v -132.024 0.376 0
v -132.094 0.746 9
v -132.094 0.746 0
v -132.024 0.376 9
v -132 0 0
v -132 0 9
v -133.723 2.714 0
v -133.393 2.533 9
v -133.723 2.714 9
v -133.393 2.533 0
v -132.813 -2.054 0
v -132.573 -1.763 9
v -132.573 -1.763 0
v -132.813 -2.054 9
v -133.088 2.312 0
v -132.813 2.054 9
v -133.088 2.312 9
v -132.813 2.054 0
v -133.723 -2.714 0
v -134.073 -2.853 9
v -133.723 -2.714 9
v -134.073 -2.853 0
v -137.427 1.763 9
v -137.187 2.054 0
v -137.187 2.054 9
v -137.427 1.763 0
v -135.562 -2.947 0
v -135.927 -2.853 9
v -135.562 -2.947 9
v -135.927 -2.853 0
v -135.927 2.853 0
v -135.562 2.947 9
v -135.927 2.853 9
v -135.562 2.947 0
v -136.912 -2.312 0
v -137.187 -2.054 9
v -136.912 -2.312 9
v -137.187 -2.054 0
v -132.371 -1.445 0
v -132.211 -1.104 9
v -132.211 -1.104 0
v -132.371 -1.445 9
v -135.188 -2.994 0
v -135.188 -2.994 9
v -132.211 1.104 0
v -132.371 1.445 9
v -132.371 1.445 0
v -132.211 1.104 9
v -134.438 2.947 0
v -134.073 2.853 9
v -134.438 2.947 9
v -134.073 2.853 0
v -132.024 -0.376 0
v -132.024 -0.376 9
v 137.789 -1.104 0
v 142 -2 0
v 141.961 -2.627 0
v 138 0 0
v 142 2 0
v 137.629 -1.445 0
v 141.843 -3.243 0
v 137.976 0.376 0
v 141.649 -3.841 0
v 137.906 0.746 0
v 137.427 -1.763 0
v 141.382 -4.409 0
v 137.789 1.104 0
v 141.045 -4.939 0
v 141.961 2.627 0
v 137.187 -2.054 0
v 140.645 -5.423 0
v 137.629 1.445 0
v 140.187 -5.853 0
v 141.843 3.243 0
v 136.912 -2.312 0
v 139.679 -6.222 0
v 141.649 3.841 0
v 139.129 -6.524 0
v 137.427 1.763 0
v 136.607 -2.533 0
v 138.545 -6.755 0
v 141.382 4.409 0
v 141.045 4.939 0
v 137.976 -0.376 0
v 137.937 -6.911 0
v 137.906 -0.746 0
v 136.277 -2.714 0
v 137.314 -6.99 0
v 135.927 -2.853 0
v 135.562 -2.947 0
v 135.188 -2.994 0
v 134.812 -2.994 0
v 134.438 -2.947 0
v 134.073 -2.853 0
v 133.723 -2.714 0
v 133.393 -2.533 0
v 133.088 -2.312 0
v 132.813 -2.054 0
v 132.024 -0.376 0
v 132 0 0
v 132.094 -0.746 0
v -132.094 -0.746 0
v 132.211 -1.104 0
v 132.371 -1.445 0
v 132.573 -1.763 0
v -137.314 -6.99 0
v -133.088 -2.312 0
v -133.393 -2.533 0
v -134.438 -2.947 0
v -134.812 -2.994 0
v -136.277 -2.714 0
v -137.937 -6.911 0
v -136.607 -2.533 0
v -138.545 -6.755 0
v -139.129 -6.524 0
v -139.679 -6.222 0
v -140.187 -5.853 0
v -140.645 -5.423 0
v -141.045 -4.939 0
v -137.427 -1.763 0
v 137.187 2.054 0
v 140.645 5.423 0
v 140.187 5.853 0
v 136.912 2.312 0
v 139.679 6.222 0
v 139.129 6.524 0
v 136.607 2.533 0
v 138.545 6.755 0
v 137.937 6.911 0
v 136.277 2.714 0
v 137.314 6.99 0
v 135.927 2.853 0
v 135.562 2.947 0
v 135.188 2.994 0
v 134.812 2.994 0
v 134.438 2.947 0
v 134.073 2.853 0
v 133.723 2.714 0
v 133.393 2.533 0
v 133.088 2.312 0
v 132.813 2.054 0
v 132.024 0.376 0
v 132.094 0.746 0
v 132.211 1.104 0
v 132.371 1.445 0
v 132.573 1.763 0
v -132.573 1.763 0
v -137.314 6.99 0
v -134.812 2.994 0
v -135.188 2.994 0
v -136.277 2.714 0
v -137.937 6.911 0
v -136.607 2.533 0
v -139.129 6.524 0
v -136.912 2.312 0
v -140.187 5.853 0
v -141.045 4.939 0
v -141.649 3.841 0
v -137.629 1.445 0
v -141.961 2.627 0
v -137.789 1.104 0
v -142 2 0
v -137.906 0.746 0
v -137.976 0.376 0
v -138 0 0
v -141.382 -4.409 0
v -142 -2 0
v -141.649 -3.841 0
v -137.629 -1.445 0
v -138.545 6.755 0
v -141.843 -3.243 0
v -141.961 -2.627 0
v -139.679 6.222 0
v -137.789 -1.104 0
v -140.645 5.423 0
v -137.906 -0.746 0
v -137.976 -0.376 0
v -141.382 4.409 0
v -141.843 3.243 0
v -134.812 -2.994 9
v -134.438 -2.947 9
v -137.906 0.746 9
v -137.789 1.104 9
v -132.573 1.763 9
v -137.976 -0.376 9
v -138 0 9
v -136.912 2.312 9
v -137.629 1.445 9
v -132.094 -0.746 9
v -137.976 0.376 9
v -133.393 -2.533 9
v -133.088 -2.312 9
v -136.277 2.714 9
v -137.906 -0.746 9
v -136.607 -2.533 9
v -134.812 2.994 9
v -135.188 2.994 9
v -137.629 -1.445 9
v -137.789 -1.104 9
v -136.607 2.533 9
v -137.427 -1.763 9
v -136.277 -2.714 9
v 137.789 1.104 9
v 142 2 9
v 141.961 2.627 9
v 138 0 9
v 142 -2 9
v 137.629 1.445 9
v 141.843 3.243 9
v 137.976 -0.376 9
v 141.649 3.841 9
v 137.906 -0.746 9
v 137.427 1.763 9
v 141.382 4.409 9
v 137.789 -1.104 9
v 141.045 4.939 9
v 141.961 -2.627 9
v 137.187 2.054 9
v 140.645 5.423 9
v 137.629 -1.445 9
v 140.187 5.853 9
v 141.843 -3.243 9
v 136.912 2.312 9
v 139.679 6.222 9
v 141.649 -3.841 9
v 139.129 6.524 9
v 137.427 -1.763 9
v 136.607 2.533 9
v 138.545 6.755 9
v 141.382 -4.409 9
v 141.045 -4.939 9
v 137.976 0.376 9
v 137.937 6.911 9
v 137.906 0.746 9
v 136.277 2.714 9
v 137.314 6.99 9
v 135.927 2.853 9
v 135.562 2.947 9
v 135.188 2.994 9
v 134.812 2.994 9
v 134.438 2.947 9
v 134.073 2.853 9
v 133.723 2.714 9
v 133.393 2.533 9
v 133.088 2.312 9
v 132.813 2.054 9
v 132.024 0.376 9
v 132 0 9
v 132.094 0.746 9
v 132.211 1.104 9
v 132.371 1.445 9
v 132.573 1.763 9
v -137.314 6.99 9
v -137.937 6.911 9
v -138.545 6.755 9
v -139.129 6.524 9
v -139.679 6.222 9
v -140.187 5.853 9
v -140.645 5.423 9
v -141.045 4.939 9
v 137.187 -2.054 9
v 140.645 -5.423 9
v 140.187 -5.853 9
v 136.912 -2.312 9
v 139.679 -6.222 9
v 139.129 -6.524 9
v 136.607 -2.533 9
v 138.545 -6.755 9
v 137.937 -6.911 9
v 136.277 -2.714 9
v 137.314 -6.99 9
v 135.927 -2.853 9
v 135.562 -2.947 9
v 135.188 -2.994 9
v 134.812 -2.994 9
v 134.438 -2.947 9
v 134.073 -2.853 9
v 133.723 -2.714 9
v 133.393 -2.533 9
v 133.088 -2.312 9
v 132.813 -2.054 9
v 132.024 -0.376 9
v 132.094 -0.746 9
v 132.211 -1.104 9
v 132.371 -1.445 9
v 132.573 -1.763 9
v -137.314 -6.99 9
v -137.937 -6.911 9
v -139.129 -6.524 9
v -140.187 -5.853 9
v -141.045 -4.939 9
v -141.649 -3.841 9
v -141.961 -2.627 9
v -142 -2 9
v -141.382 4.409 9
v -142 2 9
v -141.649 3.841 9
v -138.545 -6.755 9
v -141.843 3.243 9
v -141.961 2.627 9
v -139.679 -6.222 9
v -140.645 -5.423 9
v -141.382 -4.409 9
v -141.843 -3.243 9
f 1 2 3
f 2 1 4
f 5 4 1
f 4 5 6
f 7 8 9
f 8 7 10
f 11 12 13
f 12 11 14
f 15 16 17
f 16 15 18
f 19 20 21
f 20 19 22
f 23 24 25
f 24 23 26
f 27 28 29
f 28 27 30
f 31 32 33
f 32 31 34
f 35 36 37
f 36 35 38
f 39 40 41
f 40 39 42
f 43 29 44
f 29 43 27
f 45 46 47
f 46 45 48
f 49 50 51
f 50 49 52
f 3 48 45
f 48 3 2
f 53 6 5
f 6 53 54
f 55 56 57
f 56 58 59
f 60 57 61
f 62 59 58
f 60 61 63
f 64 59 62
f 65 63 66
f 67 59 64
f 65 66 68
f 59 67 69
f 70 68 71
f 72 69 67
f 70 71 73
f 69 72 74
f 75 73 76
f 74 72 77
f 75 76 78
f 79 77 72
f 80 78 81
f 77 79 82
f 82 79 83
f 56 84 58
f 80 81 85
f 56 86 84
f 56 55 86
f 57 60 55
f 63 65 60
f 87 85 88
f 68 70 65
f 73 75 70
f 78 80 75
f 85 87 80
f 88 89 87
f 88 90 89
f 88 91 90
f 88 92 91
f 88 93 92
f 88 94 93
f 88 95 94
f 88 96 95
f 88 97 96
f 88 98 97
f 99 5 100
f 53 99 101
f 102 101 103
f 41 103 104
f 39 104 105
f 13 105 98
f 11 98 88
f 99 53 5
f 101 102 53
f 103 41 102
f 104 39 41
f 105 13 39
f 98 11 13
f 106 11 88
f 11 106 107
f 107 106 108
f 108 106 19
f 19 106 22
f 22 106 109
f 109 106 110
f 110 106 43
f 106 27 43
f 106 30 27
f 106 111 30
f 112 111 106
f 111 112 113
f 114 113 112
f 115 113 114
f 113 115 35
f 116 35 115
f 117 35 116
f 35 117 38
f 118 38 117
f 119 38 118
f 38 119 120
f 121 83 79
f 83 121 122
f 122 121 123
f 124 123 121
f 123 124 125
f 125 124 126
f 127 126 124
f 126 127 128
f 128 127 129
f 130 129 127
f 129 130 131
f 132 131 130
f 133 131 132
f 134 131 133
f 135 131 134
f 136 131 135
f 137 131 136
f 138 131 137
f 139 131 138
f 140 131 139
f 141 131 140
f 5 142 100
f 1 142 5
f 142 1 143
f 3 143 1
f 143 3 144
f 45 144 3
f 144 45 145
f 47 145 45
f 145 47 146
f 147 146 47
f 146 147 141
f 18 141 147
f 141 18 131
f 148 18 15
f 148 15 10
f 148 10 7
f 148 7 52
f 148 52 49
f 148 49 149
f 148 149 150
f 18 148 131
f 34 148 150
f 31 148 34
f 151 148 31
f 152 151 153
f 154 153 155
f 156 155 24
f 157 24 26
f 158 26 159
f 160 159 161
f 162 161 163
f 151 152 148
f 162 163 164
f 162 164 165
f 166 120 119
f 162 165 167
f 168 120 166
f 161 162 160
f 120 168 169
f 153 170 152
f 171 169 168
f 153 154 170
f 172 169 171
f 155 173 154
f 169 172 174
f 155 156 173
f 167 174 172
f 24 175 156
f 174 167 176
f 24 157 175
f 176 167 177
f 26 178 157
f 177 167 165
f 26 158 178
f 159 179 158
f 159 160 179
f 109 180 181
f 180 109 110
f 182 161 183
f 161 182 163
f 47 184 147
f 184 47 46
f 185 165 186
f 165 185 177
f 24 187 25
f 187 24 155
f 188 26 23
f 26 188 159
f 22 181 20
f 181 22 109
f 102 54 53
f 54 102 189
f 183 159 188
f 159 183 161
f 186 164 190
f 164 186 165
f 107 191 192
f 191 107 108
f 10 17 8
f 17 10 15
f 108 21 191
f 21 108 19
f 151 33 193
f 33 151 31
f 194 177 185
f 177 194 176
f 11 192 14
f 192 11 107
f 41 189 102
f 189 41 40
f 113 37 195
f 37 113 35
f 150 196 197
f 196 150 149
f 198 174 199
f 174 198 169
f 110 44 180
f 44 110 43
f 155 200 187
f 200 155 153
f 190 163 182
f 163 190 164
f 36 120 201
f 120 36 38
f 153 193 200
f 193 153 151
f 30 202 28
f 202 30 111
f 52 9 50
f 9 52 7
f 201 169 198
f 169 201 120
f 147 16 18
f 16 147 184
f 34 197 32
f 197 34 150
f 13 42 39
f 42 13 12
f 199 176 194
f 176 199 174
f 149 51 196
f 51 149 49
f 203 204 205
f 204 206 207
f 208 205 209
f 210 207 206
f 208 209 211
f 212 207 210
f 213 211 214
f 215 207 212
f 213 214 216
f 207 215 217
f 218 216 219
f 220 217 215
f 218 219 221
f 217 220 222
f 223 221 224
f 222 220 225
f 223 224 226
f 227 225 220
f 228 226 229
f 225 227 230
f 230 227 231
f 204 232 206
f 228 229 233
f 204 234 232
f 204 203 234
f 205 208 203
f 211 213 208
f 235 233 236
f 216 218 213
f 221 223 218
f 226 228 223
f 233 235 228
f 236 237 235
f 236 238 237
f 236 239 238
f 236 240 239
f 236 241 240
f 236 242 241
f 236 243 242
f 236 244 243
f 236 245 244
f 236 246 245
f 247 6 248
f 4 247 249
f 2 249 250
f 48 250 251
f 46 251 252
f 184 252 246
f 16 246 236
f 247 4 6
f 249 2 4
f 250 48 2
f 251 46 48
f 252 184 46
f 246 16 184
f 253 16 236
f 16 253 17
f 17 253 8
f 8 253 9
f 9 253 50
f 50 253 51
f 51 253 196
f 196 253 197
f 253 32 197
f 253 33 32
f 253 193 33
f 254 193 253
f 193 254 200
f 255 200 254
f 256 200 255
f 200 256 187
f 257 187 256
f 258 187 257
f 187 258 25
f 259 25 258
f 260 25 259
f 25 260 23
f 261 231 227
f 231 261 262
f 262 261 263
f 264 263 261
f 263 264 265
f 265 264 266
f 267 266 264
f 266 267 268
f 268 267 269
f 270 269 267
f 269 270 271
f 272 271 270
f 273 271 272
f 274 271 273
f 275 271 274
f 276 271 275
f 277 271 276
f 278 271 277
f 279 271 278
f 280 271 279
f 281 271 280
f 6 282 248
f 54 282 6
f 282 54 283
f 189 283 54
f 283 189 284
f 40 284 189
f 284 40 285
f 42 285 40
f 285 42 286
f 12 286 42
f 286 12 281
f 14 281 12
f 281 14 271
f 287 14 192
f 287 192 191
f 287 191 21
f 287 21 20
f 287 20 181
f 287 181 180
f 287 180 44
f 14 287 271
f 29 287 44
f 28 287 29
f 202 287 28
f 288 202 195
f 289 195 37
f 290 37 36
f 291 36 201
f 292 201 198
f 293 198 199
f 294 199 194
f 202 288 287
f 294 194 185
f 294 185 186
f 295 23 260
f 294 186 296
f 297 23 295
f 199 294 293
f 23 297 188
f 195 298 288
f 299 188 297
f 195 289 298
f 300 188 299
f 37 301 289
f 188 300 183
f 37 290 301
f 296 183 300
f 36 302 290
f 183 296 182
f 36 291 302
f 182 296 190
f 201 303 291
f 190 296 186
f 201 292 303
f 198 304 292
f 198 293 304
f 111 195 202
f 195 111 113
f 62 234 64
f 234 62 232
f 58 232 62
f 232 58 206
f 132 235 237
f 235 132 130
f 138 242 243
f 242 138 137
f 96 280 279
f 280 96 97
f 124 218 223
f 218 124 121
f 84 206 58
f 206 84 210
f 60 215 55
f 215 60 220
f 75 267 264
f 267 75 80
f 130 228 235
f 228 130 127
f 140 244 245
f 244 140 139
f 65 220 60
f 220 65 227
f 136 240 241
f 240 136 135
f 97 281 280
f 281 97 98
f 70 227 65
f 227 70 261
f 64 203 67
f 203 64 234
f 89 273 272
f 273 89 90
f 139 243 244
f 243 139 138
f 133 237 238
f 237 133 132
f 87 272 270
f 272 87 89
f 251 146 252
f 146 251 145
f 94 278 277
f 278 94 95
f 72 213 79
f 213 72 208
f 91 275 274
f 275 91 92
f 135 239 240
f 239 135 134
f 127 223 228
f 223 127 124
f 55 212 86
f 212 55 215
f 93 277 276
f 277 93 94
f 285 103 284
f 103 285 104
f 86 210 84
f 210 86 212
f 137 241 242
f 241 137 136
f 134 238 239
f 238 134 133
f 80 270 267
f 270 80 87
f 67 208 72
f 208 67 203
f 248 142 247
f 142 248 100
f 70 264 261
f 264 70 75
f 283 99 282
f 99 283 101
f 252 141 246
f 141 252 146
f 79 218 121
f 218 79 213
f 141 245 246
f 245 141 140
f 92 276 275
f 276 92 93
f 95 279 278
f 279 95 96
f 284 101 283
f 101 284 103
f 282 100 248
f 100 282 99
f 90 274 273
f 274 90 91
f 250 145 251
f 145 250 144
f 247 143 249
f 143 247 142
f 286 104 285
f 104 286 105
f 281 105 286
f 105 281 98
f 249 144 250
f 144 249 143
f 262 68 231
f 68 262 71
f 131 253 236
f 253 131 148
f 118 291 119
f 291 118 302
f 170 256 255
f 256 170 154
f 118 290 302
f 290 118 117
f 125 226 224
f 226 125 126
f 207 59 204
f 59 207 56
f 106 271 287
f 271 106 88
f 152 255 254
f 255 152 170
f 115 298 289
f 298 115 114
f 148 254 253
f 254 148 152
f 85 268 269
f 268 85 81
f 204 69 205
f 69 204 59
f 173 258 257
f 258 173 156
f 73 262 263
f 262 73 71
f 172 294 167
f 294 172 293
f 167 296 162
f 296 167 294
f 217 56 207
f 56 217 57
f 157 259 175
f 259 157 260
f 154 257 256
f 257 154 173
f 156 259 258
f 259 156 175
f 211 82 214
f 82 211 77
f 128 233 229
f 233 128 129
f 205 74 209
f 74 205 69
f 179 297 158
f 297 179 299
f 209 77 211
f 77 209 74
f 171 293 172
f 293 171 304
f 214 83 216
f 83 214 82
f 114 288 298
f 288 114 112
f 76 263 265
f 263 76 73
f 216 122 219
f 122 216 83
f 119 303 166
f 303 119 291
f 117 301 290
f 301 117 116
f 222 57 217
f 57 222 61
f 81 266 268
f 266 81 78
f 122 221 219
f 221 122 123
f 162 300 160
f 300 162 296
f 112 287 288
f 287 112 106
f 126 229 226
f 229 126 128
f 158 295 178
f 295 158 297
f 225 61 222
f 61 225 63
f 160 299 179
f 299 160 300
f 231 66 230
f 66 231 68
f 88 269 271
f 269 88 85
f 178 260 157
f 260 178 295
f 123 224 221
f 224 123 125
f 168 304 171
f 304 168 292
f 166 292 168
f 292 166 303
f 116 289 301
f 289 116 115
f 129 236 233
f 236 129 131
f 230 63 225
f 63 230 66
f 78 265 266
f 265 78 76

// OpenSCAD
$fn = 50;


difference() {
	union() {
		hull() {
			translate(v = [-137.0000000000, 2.0000000000, 0]) {
				cylinder(h = 9, r = 5);
			}
			translate(v = [137.0000000000, 2.0000000000, 0]) {
				cylinder(h = 9, r = 5);
			}
			translate(v = [-137.0000000000, -2.0000000000, 0]) {
				cylinder(h = 9, r = 5);
			}
			translate(v = [137.0000000000, -2.0000000000, 0]) {
				cylinder(h = 9, r = 5);
			}
		}
	}
	union() {
		translate(v = [-135.0000000000, 0.0000000000, 0]) {
			cylinder(h = 9, r = 3.0000000000);
		}
		translate(v = [135.0000000000, 0.0000000000, 0]) {
			cylinder(h = 9, r = 3.0000000000);
		}
		translate(v = [-135.0000000000, 0.0000000000, 0]) {
			cylinder(h = 9, r = 1.5000000000);
		}
		translate(v = [135.0000000000, 0.0000000000, 0]) {
			cylinder(h = 9, r = 1.5000000000);
		}
		translate(v = [-135.0000000000, 0.0000000000, 0]) {
			cylinder(h = 9, r = 1.5000000000);
		}
		translate(v = [135.0000000000, 0.0000000000, 0]) {
			cylinder(h = 9, r = 1.5000000000);
		}
		translate(v = [-135.0000000000, 0.0000000000, 0]) {
			cylinder(h = 9, r = 1.5000000000);
		}
		translate(v = [135.0000000000, 0.0000000000, 0]) {
			cylinder(h = 9, r = 1.5000000000);
		}
	}
}
